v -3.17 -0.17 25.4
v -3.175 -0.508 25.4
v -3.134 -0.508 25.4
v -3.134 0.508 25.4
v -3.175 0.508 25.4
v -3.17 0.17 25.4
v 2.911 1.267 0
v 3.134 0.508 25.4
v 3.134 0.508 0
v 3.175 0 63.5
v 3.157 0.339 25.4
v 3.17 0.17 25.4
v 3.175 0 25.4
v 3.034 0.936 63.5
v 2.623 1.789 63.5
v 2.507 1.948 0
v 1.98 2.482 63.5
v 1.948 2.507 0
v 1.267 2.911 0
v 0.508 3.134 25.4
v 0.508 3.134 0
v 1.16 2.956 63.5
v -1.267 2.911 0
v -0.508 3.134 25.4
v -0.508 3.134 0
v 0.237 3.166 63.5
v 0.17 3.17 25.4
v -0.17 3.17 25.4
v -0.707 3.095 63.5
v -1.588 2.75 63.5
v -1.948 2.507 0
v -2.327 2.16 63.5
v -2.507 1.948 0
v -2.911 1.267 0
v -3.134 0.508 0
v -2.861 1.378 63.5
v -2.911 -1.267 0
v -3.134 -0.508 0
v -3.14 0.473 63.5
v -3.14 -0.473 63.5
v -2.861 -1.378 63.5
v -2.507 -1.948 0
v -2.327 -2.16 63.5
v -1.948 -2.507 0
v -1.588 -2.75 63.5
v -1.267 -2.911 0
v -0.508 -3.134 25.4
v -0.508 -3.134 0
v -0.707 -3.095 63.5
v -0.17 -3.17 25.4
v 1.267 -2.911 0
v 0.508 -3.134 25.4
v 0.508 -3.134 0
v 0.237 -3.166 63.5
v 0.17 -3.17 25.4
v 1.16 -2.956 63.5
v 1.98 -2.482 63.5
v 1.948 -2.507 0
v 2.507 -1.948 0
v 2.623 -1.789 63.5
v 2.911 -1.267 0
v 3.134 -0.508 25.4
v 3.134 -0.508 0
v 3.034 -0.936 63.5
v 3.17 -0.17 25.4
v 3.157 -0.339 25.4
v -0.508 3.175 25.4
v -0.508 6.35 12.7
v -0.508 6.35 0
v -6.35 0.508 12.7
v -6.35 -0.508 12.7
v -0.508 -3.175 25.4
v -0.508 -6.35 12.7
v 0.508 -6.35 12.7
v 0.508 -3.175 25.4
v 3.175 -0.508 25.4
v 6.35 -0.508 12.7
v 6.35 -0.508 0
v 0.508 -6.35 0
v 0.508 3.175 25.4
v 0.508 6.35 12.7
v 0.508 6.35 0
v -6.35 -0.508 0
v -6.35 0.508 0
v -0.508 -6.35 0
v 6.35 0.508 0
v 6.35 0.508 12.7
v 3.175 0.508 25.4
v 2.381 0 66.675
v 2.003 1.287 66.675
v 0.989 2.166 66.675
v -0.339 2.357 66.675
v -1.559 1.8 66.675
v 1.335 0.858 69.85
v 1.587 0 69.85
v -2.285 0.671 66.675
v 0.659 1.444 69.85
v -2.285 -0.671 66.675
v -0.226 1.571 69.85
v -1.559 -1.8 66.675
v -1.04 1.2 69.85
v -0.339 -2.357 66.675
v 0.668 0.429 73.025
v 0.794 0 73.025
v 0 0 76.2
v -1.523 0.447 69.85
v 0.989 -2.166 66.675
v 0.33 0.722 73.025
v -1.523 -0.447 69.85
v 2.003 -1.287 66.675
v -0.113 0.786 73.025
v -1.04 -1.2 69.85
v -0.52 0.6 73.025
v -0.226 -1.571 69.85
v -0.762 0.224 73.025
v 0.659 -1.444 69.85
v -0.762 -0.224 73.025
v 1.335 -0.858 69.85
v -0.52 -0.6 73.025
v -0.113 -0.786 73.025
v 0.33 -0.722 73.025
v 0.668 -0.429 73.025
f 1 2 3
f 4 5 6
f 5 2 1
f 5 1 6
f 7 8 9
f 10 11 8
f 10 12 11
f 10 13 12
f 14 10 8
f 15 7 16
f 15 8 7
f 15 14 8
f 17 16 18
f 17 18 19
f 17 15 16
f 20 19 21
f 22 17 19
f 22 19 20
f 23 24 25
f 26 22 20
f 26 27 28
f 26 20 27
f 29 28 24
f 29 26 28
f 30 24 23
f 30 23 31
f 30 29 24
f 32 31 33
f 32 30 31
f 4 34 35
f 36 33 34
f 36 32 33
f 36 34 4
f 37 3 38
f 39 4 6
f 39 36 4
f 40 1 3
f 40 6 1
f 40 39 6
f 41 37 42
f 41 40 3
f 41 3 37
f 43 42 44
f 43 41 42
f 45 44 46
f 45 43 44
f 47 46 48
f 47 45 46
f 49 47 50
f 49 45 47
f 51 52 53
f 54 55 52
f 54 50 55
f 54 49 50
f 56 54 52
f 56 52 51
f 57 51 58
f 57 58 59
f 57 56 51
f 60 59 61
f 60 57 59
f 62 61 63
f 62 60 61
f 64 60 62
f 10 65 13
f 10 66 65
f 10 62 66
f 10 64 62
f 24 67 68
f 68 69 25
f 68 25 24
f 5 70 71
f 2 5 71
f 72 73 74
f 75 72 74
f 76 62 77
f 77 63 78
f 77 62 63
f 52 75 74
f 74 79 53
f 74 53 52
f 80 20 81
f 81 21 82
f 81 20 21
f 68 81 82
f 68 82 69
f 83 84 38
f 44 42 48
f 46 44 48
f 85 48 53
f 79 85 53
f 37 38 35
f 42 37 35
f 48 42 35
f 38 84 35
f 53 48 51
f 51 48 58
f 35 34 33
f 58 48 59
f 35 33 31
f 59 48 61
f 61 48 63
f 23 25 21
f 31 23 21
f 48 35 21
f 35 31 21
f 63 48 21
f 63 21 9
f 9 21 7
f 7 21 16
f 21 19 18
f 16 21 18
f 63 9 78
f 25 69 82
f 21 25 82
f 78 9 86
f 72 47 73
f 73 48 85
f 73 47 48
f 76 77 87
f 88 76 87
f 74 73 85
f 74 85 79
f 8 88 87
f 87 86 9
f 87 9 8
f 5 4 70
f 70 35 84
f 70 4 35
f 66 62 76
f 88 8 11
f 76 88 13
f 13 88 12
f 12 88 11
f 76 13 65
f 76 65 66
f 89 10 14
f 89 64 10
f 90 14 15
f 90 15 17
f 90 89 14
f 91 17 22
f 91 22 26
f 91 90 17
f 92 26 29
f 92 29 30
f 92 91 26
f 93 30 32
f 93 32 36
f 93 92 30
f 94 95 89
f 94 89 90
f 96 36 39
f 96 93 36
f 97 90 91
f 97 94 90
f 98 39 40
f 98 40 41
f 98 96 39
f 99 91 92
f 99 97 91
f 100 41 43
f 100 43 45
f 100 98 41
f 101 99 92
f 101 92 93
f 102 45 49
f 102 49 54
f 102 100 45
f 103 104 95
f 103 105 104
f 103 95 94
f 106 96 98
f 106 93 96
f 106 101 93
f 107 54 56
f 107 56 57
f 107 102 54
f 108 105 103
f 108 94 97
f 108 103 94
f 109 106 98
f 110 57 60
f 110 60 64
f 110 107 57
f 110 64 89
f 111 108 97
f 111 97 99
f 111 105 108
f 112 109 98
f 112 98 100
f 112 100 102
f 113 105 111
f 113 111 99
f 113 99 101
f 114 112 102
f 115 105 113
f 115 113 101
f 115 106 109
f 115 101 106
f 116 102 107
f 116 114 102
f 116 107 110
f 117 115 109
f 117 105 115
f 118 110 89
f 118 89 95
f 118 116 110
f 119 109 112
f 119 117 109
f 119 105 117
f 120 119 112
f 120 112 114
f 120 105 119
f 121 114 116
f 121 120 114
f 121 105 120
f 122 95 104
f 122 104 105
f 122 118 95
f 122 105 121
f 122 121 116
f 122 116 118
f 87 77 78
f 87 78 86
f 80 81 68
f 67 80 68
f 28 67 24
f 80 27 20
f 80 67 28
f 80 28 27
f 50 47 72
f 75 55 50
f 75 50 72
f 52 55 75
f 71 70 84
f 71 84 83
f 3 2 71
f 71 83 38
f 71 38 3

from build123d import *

# Parameters (mm, degrees)
F3_DEPTH   = 25.4
F4_SIZE2   = 12.69999
F4_SIZE    = 3.17499
F4_2_SIZE2 = 12.69999
F4_2_SIZE  = 3.17499
F5_SIZE2   = 12.69999
F5_SIZE    = 3.17499
F5_2_SIZE2 = 12.69999
F5_2_SIZE  = 3.17499


# Not quite as in the source:
# - a fillet or chamfer is up to 0.001 mm smaller than in the source, because OpenCascade refuses the exact size


with BuildPart() as f2:
    # F1 (on Front) → F2 (revolve)
    with BuildSketch(Plane.XZ):
        Polygon((0, 76.2), (0, 0), (3.175, 0), (3.175, 63.5), align=None)
    revolve(axis=Axis((0, 0, 38.1), (0, 0, 1)))

    # F0 (on Top) → F3 (join)
    with BuildSketch(Plane.XY):
        with BuildLine():
            ThreePointArc((3.1340965205, 0.508), (3.1647576094, 0.2548220431), (3.175, 0))
            ThreePointArc((3.175, 0), (3.1647576094, -0.2548220431), (3.1340965205, -0.508))
            Line((3.1340965205, -0.508), (6.35, -0.508))
            Line((6.35, -0.508), (6.35, 0.508))
            Line((6.35, 0.508), (3.1340965205, 0.508))
        make_face()
        with BuildLine():
            Line((0.508, -6.35), (0.508, -3.1340965205))
            ThreePointArc((0.508, -3.1340965205), (0, -3.175), (-0.508, -3.1340965205))
            Line((-0.508, -3.1340965205), (-0.508, -6.35))
            Line((-0.508, -6.35), (0.508, -6.35))
        make_face()
        with BuildLine():
            ThreePointArc((-3.1340965205, -0.508), (-3.175, 0), (-3.1340965205, 0.508))
            Line((-3.1340965205, 0.508), (-6.35, 0.508))
            Line((-6.35, 0.508), (-6.35, -0.508))
            Line((-6.35, -0.508), (-3.1340965205, -0.508))
        make_face()
        with BuildLine():
            ThreePointArc((-0.508, 3.1340965205), (0, 3.175), (0.508, 3.1340965205))
            Line((0.508, 3.1340965205), (0.508, 6.35))
            Line((0.508, 6.35), (-0.508, 6.35))
            Line((-0.508, 6.35), (-0.508, 3.1340965205))
        make_face()
    extrude(amount=F3_DEPTH)

    # F4 (size 3.175 and 12.7 in the source; OpenCascade refuses exactly that, so slightly less here)
    f4_edges = [f2.edges().sort_by_distance(p)[0] for p in [
        (0, -6.35, 25.4),
    ]]
    f4_side = f2.faces().sort_by_distance((0, -4.755677, 25.4))[0]
    chamfer(f4_edges, length=F4_SIZE, length2=F4_SIZE2, reference=f4_side)

    # F4#2 (size 3.175 and 12.7 in the source; OpenCascade refuses exactly that, so slightly less here)
    f4_2_edges = [f2.edges().sort_by_distance(p)[0] for p in [
        (6.35, 0, 25.4),
    ]]
    f4_2_side = f2.faces().sort_by_distance((4.755677, 0, 25.4))[0]
    chamfer(f4_2_edges, length=F4_2_SIZE, length2=F4_2_SIZE2, reference=f4_2_side)

    # F5 (size 3.175 and 12.7 in the source; OpenCascade refuses exactly that, so slightly less here)
    f5_edges = [f2.edges().sort_by_distance(p)[0] for p in [
        (-6.35, 0, 25.4),
    ]]
    f5_side = f2.faces().sort_by_distance((-4.755677, 0, 25.4))[0]
    chamfer(f5_edges, length=F5_SIZE, length2=F5_SIZE2, reference=f5_side)

    # F5#2 (size 3.175 and 12.7 in the source; OpenCascade refuses exactly that, so slightly less here)
    f5_2_edges = [f2.edges().sort_by_distance(p)[0] for p in [
        (0, 6.35, 25.4),
    ]]
    f5_2_side = f2.faces().sort_by_distance((0, 4.755677, 25.4))[0]
    chamfer(f5_2_edges, length=F5_2_SIZE, length2=F5_2_SIZE2, reference=f5_2_side)


solid = f2.part
